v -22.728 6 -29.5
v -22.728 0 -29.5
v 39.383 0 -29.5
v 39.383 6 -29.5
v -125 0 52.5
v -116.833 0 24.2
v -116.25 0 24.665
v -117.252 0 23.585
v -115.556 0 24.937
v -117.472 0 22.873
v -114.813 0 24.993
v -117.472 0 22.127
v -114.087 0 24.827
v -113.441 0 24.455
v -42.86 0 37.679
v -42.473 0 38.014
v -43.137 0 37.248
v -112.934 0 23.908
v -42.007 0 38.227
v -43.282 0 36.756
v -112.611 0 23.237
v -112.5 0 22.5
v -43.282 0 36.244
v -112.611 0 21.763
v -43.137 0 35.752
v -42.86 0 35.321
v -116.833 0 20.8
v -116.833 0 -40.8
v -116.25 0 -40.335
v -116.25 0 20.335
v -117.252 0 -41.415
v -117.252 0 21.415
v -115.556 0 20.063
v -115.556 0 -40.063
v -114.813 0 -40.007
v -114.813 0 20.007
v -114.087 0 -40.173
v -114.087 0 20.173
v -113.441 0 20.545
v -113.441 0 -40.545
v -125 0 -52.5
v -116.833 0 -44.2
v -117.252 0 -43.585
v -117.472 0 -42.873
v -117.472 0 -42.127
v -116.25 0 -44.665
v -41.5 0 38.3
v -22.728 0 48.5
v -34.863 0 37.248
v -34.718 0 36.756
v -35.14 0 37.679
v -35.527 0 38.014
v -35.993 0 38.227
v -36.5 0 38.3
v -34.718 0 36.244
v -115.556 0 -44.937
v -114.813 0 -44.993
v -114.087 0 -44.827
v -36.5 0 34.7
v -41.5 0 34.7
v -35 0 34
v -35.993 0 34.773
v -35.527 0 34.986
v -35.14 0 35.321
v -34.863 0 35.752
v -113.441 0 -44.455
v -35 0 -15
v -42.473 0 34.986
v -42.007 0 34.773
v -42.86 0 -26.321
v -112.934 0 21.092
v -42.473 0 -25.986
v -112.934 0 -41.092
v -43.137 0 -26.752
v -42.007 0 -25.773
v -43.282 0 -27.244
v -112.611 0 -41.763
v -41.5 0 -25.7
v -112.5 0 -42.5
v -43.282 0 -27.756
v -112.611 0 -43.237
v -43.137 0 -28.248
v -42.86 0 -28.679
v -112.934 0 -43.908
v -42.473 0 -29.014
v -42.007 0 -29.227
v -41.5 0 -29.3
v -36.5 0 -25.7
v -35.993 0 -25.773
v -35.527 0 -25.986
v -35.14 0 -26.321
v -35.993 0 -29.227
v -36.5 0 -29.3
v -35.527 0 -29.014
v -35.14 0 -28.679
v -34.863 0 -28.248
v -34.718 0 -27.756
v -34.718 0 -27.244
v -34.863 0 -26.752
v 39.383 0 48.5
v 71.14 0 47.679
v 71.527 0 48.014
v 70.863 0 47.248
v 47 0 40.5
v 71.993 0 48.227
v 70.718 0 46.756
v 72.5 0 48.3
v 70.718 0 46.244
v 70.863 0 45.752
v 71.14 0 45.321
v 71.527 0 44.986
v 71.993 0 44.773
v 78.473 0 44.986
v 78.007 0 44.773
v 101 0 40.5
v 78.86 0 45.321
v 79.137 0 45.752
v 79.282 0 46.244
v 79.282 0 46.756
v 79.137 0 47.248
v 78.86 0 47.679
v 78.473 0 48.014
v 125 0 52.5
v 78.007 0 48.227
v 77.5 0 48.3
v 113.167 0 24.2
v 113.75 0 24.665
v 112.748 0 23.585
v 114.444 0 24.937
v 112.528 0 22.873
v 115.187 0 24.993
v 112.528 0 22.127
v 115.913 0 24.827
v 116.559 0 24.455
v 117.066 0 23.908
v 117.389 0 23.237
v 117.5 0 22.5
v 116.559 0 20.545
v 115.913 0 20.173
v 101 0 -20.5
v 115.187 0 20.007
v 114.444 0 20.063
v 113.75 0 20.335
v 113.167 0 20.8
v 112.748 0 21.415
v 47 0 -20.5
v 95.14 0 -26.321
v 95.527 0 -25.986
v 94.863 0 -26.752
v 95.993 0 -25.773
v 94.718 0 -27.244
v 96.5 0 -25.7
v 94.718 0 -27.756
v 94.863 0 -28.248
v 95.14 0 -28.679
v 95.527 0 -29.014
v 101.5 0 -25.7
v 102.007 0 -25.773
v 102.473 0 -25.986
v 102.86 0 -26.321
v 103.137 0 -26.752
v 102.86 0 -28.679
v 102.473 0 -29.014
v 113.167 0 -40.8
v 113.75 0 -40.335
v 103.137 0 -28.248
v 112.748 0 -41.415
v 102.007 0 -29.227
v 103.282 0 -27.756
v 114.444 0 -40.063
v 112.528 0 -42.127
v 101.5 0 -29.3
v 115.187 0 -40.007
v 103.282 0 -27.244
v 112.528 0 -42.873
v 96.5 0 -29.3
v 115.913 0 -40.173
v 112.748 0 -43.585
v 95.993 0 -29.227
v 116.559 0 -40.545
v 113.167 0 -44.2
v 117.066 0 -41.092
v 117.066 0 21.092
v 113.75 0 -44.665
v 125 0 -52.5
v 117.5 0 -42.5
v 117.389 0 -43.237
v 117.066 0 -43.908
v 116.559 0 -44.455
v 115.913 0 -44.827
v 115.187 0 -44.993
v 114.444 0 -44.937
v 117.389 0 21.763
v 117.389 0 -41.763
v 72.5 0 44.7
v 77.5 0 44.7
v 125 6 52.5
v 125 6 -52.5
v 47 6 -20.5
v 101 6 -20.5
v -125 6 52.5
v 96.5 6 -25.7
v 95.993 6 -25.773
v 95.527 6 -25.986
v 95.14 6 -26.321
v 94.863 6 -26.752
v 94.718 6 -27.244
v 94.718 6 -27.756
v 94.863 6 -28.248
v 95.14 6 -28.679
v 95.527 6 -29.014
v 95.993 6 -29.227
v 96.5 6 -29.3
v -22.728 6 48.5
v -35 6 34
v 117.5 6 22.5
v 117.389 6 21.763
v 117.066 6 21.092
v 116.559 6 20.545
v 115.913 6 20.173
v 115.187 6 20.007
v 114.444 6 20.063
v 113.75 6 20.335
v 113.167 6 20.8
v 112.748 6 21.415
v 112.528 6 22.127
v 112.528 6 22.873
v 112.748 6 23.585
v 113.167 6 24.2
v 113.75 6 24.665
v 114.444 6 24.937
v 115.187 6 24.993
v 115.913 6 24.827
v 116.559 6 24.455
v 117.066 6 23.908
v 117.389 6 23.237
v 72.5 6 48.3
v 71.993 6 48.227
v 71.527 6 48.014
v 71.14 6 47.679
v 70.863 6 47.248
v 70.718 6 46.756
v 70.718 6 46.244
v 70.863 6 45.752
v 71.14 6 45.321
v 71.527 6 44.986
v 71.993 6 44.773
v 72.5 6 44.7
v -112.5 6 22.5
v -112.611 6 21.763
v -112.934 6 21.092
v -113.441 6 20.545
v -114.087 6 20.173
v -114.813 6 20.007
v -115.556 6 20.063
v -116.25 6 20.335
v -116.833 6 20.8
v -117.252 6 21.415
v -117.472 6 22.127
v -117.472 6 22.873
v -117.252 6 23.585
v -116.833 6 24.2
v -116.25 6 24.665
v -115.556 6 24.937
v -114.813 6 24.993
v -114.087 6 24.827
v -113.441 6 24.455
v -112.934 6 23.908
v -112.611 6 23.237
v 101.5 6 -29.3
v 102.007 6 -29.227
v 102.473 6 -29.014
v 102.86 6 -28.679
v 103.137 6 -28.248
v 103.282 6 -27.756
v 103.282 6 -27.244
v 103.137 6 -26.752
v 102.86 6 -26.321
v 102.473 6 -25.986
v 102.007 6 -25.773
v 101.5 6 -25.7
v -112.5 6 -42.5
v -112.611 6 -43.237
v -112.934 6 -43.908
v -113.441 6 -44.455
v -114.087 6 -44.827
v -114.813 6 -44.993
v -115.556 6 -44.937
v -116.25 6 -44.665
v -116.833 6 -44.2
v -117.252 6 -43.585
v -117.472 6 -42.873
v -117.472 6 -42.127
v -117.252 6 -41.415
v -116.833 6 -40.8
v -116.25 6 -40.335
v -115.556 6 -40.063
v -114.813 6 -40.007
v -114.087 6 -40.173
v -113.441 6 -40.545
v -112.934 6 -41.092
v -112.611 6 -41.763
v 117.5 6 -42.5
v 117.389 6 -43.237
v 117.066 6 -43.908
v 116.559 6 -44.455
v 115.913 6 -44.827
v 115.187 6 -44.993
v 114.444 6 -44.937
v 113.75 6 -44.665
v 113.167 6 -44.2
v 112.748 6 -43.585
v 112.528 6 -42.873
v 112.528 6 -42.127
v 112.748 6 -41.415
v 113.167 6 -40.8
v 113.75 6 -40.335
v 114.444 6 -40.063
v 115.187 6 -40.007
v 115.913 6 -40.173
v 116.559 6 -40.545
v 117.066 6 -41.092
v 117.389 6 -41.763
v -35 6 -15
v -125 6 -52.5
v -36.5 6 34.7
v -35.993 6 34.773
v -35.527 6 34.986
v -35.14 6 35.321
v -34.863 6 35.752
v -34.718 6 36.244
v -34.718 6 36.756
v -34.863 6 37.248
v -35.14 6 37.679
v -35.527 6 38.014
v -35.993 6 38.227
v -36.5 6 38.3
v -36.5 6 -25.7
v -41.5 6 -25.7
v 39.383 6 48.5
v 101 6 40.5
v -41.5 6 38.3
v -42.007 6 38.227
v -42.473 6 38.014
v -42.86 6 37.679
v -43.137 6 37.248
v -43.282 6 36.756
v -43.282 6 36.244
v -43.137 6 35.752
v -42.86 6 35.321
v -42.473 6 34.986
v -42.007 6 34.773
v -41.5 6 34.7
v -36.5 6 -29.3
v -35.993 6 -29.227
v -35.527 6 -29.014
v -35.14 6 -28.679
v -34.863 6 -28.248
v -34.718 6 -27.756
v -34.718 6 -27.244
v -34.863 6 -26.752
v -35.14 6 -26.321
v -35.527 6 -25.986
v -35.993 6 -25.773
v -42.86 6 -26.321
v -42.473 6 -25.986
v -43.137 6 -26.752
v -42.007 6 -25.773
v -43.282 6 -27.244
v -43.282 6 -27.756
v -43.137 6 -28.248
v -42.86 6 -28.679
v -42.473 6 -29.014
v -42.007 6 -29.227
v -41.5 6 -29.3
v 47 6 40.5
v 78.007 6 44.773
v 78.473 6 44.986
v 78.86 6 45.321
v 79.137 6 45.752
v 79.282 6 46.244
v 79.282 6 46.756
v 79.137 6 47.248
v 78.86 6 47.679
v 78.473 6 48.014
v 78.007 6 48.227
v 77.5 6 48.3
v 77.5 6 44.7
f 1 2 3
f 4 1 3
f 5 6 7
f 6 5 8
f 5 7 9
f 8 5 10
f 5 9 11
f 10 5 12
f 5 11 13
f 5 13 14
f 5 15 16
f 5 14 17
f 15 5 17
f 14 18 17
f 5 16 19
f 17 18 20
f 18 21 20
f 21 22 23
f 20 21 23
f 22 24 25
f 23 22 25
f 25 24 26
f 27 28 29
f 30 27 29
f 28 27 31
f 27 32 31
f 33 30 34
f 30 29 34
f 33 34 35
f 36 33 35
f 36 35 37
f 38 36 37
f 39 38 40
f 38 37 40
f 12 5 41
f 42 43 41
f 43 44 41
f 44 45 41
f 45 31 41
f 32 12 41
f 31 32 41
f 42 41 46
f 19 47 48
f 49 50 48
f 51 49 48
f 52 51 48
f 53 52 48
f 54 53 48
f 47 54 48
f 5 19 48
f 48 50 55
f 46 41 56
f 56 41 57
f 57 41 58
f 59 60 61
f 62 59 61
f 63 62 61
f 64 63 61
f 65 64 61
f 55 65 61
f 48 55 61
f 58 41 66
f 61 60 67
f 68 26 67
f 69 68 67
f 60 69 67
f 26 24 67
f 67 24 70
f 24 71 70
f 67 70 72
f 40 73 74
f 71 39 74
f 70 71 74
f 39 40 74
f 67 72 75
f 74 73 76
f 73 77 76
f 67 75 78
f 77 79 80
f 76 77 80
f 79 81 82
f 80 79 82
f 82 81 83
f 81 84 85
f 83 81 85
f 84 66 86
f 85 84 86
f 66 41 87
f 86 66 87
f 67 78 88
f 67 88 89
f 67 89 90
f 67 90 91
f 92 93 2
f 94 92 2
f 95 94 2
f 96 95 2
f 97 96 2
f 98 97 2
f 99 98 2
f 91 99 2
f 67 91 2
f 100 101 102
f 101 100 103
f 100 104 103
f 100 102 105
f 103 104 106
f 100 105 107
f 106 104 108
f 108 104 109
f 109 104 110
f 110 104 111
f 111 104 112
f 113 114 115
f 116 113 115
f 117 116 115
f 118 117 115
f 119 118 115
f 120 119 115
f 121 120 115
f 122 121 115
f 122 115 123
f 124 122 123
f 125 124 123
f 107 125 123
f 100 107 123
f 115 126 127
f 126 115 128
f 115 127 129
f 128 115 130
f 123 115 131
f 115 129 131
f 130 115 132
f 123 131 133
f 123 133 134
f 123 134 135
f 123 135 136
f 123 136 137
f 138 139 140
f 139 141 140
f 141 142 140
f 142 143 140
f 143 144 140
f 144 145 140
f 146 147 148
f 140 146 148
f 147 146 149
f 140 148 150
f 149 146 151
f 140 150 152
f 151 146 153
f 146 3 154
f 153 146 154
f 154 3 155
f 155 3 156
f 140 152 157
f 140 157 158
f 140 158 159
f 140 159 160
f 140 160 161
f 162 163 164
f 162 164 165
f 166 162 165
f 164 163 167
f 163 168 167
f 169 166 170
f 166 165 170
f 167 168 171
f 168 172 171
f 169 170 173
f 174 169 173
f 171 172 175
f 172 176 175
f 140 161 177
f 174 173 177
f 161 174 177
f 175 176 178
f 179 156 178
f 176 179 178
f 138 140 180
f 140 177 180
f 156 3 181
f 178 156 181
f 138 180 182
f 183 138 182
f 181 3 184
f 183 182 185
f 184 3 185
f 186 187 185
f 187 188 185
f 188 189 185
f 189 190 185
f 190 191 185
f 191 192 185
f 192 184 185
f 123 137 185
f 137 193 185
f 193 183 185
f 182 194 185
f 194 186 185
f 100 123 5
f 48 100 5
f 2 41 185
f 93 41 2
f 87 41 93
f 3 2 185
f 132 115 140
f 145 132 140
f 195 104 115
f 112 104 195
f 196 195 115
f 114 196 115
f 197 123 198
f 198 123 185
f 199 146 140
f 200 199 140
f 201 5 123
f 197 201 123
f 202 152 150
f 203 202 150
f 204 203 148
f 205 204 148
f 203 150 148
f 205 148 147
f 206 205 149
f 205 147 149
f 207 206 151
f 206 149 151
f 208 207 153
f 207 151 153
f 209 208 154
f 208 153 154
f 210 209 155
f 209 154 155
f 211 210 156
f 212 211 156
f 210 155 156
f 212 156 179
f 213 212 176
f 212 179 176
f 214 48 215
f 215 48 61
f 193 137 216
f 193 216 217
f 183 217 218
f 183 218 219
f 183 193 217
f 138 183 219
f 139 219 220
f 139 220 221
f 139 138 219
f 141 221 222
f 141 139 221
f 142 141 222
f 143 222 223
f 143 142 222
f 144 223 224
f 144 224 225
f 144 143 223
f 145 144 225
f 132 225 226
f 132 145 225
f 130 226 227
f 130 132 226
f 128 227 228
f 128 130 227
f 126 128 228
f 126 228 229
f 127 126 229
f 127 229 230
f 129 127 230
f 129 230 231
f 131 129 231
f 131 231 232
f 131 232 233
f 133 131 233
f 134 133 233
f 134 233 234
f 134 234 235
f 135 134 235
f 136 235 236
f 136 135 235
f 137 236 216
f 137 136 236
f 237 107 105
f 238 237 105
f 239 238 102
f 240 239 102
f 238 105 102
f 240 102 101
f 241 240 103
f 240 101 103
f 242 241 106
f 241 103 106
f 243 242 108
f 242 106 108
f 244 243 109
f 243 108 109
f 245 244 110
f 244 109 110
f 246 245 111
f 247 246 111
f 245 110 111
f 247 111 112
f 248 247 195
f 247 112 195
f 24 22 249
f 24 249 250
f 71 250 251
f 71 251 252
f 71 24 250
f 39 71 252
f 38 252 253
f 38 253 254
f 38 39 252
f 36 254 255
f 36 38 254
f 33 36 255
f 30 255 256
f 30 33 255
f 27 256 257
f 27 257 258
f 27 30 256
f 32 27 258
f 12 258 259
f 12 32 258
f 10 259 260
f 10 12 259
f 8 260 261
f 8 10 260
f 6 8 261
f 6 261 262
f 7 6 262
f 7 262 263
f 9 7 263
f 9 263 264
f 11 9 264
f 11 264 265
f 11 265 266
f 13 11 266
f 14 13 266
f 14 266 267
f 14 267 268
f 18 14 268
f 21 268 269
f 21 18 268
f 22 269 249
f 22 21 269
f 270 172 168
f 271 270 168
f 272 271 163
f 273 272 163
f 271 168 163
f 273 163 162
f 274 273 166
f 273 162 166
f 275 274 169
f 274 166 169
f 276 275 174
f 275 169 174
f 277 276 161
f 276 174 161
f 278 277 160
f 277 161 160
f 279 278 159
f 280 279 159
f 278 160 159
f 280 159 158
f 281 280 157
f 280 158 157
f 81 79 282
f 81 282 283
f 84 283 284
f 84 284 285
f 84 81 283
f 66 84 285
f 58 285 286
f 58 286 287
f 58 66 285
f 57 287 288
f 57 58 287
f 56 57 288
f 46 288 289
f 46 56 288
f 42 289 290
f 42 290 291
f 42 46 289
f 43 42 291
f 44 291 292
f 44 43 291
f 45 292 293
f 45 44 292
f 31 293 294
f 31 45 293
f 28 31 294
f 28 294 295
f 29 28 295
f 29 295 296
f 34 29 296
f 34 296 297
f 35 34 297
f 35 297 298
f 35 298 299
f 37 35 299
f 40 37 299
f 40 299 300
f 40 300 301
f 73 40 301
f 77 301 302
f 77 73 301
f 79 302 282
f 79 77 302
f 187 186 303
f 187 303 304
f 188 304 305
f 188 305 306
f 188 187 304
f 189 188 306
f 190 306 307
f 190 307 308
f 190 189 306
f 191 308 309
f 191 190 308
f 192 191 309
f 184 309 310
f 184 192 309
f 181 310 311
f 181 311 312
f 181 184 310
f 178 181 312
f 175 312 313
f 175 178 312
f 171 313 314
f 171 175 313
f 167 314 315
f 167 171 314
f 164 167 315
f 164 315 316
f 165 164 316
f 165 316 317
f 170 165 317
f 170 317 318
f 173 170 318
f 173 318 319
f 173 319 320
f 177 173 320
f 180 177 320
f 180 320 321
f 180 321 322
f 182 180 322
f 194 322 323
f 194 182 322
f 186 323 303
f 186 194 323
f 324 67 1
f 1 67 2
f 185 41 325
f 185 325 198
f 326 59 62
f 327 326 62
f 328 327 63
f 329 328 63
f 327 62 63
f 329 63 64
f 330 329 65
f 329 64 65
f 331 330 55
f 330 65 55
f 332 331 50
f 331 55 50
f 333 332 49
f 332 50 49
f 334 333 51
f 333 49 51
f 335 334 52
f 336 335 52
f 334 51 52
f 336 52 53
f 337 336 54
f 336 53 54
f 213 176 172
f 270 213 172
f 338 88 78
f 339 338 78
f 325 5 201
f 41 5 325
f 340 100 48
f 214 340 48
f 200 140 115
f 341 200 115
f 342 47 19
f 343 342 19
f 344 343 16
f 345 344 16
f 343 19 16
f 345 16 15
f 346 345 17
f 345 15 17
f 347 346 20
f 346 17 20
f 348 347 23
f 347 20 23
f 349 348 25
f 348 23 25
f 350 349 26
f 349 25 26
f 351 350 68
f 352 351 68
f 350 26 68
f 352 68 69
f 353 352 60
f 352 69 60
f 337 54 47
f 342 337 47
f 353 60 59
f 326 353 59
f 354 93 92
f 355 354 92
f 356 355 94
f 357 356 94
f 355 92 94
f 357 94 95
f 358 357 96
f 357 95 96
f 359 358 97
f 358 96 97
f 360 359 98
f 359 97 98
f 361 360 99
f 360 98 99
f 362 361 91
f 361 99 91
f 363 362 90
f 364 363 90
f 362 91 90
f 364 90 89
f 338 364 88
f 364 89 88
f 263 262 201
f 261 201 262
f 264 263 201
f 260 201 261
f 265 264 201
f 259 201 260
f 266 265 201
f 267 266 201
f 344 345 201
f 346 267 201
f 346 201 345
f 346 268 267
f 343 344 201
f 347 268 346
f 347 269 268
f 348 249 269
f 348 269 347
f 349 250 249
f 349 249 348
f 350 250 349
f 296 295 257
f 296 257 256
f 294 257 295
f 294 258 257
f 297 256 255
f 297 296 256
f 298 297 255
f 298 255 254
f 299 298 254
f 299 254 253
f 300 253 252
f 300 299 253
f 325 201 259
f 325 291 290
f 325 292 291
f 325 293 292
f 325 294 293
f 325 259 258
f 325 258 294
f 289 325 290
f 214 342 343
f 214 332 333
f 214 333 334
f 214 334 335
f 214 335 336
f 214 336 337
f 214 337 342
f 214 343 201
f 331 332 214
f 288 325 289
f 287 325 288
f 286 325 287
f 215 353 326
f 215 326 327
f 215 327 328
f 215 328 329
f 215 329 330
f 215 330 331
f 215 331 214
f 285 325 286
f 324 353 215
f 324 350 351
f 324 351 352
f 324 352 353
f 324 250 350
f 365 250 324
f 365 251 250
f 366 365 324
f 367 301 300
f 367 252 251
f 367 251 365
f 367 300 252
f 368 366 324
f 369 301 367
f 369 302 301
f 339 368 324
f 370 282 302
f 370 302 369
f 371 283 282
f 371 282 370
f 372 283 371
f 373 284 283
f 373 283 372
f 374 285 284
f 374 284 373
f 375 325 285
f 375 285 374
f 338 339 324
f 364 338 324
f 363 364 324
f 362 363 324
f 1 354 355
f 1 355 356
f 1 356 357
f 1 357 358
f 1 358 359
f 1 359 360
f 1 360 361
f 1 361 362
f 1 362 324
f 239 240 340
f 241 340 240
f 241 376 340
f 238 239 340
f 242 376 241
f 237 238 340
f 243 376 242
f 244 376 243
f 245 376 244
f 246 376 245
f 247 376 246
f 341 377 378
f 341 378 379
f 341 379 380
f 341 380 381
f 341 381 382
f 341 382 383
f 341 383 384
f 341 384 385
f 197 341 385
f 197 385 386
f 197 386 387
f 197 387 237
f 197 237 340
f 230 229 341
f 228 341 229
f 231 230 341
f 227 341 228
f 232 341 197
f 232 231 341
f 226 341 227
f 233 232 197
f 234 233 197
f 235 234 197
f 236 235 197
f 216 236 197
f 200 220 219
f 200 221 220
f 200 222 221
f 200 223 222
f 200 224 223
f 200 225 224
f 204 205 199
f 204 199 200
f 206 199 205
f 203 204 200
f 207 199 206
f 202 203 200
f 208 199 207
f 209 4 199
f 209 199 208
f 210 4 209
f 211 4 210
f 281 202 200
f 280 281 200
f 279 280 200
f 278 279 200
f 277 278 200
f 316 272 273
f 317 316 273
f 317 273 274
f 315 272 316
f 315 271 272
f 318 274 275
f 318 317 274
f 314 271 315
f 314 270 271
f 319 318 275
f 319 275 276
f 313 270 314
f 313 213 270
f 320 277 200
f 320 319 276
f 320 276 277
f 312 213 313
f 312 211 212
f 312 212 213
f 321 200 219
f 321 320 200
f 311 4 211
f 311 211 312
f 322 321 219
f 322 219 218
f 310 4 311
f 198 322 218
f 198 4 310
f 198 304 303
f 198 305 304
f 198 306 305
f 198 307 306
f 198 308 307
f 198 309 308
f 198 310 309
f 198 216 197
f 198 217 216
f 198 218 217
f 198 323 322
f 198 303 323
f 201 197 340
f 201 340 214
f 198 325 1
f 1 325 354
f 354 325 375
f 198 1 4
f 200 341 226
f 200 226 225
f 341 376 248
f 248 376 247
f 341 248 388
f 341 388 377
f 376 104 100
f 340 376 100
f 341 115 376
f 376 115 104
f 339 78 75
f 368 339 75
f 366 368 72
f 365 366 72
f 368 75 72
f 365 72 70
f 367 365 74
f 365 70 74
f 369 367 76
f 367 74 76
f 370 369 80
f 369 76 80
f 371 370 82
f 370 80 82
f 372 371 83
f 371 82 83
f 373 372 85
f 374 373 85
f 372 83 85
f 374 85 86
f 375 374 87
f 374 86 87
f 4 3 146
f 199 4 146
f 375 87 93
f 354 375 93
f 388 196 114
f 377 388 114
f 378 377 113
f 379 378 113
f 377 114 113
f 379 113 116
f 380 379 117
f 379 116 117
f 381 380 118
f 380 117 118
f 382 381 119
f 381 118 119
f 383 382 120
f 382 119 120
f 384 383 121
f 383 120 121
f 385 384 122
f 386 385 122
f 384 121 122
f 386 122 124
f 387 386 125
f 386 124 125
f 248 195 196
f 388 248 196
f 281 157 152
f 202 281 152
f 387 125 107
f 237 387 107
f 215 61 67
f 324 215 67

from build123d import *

# Parameters (mm, degrees)
SKETCH1_W           = 250
SKETCH1_H           = 105
BOSS_EXTRUDE1_DEPTH = 6
SKETCH1_4_R         = 2.5
CUT_EXTRUDE1_DEPTH  = 6


with BuildPart() as part:
    # Sketch1 → Boss-Extrude1 (new body)
    with BuildSketch(Plane(origin=(0, 0, 0), x_dir=(1, 0, 0), z_dir=(0, 1, 0))):
        Rectangle(SKETCH1_W, SKETCH1_H)
    extrude(amount=BOSS_EXTRUDE1_DEPTH)

    # Sketch1<4> → Cut-Extrude1 (cut)
    with BuildSketch(Plane(origin=(0, 0, 0), x_dir=(1, 0, 0), z_dir=(0, 1, 0))):
        with Locations((-115, -22.5)):
            Circle(SKETCH1_4_R)
        with Locations((-115, 42.5)):
            Circle(SKETCH1_4_R)
        with Locations((115, 42.5)):
            Circle(SKETCH1_4_R)
        with Locations((115, -22.5)):
            Circle(SKETCH1_4_R)
        Polygon((-22.728448276, 29.5), (39.383174792, 29.5), (47, 20.5), (101, 20.5), (101, -40.5), (47, -40.5), (39.383174792, -48.5), (-22.728448276, -48.5), (-35, -34), (-35, 15), align=None)
        with BuildLine():
            Line((72.5, -44.7), (77.5, -44.7))
            ThreePointArc((77.5, -44.7), (79.3, -46.5), (77.5, -48.3))
            Line((77.5, -48.3), (72.5, -48.3))
            ThreePointArc((72.5, -48.3), (70.7, -46.5), (72.5, -44.7))
        make_face()
        with BuildLine():
            Line((96.5, 29.3), (101.5, 29.3))
            ThreePointArc((101.5, 29.3), (103.3, 27.5), (101.5, 25.7))
            Line((101.5, 25.7), (96.5, 25.7))
            ThreePointArc((96.5, 25.7), (94.7, 27.5), (96.5, 29.3))
        make_face()
        with BuildLine():
            Line((-41.5, 29.3), (-36.5, 29.3))
            ThreePointArc((-36.5, 29.3), (-34.7, 27.5), (-36.5, 25.7))
            Line((-36.5, 25.7), (-41.5, 25.7))
            ThreePointArc((-41.5, 25.7), (-43.3, 27.5), (-41.5, 29.3))
        make_face()
        with BuildLine():
            Line((-41.5, -34.7), (-36.5, -34.7))
            ThreePointArc((-36.5, -34.7), (-34.7, -36.5), (-36.5, -38.3))
            Line((-36.5, -38.3), (-41.5, -38.3))
            ThreePointArc((-41.5, -38.3), (-43.3, -36.5), (-41.5, -34.7))
        make_face()
    extrude(amount=CUT_EXTRUDE1_DEPTH, mode=Mode.SUBTRACT)


solid = part.part
